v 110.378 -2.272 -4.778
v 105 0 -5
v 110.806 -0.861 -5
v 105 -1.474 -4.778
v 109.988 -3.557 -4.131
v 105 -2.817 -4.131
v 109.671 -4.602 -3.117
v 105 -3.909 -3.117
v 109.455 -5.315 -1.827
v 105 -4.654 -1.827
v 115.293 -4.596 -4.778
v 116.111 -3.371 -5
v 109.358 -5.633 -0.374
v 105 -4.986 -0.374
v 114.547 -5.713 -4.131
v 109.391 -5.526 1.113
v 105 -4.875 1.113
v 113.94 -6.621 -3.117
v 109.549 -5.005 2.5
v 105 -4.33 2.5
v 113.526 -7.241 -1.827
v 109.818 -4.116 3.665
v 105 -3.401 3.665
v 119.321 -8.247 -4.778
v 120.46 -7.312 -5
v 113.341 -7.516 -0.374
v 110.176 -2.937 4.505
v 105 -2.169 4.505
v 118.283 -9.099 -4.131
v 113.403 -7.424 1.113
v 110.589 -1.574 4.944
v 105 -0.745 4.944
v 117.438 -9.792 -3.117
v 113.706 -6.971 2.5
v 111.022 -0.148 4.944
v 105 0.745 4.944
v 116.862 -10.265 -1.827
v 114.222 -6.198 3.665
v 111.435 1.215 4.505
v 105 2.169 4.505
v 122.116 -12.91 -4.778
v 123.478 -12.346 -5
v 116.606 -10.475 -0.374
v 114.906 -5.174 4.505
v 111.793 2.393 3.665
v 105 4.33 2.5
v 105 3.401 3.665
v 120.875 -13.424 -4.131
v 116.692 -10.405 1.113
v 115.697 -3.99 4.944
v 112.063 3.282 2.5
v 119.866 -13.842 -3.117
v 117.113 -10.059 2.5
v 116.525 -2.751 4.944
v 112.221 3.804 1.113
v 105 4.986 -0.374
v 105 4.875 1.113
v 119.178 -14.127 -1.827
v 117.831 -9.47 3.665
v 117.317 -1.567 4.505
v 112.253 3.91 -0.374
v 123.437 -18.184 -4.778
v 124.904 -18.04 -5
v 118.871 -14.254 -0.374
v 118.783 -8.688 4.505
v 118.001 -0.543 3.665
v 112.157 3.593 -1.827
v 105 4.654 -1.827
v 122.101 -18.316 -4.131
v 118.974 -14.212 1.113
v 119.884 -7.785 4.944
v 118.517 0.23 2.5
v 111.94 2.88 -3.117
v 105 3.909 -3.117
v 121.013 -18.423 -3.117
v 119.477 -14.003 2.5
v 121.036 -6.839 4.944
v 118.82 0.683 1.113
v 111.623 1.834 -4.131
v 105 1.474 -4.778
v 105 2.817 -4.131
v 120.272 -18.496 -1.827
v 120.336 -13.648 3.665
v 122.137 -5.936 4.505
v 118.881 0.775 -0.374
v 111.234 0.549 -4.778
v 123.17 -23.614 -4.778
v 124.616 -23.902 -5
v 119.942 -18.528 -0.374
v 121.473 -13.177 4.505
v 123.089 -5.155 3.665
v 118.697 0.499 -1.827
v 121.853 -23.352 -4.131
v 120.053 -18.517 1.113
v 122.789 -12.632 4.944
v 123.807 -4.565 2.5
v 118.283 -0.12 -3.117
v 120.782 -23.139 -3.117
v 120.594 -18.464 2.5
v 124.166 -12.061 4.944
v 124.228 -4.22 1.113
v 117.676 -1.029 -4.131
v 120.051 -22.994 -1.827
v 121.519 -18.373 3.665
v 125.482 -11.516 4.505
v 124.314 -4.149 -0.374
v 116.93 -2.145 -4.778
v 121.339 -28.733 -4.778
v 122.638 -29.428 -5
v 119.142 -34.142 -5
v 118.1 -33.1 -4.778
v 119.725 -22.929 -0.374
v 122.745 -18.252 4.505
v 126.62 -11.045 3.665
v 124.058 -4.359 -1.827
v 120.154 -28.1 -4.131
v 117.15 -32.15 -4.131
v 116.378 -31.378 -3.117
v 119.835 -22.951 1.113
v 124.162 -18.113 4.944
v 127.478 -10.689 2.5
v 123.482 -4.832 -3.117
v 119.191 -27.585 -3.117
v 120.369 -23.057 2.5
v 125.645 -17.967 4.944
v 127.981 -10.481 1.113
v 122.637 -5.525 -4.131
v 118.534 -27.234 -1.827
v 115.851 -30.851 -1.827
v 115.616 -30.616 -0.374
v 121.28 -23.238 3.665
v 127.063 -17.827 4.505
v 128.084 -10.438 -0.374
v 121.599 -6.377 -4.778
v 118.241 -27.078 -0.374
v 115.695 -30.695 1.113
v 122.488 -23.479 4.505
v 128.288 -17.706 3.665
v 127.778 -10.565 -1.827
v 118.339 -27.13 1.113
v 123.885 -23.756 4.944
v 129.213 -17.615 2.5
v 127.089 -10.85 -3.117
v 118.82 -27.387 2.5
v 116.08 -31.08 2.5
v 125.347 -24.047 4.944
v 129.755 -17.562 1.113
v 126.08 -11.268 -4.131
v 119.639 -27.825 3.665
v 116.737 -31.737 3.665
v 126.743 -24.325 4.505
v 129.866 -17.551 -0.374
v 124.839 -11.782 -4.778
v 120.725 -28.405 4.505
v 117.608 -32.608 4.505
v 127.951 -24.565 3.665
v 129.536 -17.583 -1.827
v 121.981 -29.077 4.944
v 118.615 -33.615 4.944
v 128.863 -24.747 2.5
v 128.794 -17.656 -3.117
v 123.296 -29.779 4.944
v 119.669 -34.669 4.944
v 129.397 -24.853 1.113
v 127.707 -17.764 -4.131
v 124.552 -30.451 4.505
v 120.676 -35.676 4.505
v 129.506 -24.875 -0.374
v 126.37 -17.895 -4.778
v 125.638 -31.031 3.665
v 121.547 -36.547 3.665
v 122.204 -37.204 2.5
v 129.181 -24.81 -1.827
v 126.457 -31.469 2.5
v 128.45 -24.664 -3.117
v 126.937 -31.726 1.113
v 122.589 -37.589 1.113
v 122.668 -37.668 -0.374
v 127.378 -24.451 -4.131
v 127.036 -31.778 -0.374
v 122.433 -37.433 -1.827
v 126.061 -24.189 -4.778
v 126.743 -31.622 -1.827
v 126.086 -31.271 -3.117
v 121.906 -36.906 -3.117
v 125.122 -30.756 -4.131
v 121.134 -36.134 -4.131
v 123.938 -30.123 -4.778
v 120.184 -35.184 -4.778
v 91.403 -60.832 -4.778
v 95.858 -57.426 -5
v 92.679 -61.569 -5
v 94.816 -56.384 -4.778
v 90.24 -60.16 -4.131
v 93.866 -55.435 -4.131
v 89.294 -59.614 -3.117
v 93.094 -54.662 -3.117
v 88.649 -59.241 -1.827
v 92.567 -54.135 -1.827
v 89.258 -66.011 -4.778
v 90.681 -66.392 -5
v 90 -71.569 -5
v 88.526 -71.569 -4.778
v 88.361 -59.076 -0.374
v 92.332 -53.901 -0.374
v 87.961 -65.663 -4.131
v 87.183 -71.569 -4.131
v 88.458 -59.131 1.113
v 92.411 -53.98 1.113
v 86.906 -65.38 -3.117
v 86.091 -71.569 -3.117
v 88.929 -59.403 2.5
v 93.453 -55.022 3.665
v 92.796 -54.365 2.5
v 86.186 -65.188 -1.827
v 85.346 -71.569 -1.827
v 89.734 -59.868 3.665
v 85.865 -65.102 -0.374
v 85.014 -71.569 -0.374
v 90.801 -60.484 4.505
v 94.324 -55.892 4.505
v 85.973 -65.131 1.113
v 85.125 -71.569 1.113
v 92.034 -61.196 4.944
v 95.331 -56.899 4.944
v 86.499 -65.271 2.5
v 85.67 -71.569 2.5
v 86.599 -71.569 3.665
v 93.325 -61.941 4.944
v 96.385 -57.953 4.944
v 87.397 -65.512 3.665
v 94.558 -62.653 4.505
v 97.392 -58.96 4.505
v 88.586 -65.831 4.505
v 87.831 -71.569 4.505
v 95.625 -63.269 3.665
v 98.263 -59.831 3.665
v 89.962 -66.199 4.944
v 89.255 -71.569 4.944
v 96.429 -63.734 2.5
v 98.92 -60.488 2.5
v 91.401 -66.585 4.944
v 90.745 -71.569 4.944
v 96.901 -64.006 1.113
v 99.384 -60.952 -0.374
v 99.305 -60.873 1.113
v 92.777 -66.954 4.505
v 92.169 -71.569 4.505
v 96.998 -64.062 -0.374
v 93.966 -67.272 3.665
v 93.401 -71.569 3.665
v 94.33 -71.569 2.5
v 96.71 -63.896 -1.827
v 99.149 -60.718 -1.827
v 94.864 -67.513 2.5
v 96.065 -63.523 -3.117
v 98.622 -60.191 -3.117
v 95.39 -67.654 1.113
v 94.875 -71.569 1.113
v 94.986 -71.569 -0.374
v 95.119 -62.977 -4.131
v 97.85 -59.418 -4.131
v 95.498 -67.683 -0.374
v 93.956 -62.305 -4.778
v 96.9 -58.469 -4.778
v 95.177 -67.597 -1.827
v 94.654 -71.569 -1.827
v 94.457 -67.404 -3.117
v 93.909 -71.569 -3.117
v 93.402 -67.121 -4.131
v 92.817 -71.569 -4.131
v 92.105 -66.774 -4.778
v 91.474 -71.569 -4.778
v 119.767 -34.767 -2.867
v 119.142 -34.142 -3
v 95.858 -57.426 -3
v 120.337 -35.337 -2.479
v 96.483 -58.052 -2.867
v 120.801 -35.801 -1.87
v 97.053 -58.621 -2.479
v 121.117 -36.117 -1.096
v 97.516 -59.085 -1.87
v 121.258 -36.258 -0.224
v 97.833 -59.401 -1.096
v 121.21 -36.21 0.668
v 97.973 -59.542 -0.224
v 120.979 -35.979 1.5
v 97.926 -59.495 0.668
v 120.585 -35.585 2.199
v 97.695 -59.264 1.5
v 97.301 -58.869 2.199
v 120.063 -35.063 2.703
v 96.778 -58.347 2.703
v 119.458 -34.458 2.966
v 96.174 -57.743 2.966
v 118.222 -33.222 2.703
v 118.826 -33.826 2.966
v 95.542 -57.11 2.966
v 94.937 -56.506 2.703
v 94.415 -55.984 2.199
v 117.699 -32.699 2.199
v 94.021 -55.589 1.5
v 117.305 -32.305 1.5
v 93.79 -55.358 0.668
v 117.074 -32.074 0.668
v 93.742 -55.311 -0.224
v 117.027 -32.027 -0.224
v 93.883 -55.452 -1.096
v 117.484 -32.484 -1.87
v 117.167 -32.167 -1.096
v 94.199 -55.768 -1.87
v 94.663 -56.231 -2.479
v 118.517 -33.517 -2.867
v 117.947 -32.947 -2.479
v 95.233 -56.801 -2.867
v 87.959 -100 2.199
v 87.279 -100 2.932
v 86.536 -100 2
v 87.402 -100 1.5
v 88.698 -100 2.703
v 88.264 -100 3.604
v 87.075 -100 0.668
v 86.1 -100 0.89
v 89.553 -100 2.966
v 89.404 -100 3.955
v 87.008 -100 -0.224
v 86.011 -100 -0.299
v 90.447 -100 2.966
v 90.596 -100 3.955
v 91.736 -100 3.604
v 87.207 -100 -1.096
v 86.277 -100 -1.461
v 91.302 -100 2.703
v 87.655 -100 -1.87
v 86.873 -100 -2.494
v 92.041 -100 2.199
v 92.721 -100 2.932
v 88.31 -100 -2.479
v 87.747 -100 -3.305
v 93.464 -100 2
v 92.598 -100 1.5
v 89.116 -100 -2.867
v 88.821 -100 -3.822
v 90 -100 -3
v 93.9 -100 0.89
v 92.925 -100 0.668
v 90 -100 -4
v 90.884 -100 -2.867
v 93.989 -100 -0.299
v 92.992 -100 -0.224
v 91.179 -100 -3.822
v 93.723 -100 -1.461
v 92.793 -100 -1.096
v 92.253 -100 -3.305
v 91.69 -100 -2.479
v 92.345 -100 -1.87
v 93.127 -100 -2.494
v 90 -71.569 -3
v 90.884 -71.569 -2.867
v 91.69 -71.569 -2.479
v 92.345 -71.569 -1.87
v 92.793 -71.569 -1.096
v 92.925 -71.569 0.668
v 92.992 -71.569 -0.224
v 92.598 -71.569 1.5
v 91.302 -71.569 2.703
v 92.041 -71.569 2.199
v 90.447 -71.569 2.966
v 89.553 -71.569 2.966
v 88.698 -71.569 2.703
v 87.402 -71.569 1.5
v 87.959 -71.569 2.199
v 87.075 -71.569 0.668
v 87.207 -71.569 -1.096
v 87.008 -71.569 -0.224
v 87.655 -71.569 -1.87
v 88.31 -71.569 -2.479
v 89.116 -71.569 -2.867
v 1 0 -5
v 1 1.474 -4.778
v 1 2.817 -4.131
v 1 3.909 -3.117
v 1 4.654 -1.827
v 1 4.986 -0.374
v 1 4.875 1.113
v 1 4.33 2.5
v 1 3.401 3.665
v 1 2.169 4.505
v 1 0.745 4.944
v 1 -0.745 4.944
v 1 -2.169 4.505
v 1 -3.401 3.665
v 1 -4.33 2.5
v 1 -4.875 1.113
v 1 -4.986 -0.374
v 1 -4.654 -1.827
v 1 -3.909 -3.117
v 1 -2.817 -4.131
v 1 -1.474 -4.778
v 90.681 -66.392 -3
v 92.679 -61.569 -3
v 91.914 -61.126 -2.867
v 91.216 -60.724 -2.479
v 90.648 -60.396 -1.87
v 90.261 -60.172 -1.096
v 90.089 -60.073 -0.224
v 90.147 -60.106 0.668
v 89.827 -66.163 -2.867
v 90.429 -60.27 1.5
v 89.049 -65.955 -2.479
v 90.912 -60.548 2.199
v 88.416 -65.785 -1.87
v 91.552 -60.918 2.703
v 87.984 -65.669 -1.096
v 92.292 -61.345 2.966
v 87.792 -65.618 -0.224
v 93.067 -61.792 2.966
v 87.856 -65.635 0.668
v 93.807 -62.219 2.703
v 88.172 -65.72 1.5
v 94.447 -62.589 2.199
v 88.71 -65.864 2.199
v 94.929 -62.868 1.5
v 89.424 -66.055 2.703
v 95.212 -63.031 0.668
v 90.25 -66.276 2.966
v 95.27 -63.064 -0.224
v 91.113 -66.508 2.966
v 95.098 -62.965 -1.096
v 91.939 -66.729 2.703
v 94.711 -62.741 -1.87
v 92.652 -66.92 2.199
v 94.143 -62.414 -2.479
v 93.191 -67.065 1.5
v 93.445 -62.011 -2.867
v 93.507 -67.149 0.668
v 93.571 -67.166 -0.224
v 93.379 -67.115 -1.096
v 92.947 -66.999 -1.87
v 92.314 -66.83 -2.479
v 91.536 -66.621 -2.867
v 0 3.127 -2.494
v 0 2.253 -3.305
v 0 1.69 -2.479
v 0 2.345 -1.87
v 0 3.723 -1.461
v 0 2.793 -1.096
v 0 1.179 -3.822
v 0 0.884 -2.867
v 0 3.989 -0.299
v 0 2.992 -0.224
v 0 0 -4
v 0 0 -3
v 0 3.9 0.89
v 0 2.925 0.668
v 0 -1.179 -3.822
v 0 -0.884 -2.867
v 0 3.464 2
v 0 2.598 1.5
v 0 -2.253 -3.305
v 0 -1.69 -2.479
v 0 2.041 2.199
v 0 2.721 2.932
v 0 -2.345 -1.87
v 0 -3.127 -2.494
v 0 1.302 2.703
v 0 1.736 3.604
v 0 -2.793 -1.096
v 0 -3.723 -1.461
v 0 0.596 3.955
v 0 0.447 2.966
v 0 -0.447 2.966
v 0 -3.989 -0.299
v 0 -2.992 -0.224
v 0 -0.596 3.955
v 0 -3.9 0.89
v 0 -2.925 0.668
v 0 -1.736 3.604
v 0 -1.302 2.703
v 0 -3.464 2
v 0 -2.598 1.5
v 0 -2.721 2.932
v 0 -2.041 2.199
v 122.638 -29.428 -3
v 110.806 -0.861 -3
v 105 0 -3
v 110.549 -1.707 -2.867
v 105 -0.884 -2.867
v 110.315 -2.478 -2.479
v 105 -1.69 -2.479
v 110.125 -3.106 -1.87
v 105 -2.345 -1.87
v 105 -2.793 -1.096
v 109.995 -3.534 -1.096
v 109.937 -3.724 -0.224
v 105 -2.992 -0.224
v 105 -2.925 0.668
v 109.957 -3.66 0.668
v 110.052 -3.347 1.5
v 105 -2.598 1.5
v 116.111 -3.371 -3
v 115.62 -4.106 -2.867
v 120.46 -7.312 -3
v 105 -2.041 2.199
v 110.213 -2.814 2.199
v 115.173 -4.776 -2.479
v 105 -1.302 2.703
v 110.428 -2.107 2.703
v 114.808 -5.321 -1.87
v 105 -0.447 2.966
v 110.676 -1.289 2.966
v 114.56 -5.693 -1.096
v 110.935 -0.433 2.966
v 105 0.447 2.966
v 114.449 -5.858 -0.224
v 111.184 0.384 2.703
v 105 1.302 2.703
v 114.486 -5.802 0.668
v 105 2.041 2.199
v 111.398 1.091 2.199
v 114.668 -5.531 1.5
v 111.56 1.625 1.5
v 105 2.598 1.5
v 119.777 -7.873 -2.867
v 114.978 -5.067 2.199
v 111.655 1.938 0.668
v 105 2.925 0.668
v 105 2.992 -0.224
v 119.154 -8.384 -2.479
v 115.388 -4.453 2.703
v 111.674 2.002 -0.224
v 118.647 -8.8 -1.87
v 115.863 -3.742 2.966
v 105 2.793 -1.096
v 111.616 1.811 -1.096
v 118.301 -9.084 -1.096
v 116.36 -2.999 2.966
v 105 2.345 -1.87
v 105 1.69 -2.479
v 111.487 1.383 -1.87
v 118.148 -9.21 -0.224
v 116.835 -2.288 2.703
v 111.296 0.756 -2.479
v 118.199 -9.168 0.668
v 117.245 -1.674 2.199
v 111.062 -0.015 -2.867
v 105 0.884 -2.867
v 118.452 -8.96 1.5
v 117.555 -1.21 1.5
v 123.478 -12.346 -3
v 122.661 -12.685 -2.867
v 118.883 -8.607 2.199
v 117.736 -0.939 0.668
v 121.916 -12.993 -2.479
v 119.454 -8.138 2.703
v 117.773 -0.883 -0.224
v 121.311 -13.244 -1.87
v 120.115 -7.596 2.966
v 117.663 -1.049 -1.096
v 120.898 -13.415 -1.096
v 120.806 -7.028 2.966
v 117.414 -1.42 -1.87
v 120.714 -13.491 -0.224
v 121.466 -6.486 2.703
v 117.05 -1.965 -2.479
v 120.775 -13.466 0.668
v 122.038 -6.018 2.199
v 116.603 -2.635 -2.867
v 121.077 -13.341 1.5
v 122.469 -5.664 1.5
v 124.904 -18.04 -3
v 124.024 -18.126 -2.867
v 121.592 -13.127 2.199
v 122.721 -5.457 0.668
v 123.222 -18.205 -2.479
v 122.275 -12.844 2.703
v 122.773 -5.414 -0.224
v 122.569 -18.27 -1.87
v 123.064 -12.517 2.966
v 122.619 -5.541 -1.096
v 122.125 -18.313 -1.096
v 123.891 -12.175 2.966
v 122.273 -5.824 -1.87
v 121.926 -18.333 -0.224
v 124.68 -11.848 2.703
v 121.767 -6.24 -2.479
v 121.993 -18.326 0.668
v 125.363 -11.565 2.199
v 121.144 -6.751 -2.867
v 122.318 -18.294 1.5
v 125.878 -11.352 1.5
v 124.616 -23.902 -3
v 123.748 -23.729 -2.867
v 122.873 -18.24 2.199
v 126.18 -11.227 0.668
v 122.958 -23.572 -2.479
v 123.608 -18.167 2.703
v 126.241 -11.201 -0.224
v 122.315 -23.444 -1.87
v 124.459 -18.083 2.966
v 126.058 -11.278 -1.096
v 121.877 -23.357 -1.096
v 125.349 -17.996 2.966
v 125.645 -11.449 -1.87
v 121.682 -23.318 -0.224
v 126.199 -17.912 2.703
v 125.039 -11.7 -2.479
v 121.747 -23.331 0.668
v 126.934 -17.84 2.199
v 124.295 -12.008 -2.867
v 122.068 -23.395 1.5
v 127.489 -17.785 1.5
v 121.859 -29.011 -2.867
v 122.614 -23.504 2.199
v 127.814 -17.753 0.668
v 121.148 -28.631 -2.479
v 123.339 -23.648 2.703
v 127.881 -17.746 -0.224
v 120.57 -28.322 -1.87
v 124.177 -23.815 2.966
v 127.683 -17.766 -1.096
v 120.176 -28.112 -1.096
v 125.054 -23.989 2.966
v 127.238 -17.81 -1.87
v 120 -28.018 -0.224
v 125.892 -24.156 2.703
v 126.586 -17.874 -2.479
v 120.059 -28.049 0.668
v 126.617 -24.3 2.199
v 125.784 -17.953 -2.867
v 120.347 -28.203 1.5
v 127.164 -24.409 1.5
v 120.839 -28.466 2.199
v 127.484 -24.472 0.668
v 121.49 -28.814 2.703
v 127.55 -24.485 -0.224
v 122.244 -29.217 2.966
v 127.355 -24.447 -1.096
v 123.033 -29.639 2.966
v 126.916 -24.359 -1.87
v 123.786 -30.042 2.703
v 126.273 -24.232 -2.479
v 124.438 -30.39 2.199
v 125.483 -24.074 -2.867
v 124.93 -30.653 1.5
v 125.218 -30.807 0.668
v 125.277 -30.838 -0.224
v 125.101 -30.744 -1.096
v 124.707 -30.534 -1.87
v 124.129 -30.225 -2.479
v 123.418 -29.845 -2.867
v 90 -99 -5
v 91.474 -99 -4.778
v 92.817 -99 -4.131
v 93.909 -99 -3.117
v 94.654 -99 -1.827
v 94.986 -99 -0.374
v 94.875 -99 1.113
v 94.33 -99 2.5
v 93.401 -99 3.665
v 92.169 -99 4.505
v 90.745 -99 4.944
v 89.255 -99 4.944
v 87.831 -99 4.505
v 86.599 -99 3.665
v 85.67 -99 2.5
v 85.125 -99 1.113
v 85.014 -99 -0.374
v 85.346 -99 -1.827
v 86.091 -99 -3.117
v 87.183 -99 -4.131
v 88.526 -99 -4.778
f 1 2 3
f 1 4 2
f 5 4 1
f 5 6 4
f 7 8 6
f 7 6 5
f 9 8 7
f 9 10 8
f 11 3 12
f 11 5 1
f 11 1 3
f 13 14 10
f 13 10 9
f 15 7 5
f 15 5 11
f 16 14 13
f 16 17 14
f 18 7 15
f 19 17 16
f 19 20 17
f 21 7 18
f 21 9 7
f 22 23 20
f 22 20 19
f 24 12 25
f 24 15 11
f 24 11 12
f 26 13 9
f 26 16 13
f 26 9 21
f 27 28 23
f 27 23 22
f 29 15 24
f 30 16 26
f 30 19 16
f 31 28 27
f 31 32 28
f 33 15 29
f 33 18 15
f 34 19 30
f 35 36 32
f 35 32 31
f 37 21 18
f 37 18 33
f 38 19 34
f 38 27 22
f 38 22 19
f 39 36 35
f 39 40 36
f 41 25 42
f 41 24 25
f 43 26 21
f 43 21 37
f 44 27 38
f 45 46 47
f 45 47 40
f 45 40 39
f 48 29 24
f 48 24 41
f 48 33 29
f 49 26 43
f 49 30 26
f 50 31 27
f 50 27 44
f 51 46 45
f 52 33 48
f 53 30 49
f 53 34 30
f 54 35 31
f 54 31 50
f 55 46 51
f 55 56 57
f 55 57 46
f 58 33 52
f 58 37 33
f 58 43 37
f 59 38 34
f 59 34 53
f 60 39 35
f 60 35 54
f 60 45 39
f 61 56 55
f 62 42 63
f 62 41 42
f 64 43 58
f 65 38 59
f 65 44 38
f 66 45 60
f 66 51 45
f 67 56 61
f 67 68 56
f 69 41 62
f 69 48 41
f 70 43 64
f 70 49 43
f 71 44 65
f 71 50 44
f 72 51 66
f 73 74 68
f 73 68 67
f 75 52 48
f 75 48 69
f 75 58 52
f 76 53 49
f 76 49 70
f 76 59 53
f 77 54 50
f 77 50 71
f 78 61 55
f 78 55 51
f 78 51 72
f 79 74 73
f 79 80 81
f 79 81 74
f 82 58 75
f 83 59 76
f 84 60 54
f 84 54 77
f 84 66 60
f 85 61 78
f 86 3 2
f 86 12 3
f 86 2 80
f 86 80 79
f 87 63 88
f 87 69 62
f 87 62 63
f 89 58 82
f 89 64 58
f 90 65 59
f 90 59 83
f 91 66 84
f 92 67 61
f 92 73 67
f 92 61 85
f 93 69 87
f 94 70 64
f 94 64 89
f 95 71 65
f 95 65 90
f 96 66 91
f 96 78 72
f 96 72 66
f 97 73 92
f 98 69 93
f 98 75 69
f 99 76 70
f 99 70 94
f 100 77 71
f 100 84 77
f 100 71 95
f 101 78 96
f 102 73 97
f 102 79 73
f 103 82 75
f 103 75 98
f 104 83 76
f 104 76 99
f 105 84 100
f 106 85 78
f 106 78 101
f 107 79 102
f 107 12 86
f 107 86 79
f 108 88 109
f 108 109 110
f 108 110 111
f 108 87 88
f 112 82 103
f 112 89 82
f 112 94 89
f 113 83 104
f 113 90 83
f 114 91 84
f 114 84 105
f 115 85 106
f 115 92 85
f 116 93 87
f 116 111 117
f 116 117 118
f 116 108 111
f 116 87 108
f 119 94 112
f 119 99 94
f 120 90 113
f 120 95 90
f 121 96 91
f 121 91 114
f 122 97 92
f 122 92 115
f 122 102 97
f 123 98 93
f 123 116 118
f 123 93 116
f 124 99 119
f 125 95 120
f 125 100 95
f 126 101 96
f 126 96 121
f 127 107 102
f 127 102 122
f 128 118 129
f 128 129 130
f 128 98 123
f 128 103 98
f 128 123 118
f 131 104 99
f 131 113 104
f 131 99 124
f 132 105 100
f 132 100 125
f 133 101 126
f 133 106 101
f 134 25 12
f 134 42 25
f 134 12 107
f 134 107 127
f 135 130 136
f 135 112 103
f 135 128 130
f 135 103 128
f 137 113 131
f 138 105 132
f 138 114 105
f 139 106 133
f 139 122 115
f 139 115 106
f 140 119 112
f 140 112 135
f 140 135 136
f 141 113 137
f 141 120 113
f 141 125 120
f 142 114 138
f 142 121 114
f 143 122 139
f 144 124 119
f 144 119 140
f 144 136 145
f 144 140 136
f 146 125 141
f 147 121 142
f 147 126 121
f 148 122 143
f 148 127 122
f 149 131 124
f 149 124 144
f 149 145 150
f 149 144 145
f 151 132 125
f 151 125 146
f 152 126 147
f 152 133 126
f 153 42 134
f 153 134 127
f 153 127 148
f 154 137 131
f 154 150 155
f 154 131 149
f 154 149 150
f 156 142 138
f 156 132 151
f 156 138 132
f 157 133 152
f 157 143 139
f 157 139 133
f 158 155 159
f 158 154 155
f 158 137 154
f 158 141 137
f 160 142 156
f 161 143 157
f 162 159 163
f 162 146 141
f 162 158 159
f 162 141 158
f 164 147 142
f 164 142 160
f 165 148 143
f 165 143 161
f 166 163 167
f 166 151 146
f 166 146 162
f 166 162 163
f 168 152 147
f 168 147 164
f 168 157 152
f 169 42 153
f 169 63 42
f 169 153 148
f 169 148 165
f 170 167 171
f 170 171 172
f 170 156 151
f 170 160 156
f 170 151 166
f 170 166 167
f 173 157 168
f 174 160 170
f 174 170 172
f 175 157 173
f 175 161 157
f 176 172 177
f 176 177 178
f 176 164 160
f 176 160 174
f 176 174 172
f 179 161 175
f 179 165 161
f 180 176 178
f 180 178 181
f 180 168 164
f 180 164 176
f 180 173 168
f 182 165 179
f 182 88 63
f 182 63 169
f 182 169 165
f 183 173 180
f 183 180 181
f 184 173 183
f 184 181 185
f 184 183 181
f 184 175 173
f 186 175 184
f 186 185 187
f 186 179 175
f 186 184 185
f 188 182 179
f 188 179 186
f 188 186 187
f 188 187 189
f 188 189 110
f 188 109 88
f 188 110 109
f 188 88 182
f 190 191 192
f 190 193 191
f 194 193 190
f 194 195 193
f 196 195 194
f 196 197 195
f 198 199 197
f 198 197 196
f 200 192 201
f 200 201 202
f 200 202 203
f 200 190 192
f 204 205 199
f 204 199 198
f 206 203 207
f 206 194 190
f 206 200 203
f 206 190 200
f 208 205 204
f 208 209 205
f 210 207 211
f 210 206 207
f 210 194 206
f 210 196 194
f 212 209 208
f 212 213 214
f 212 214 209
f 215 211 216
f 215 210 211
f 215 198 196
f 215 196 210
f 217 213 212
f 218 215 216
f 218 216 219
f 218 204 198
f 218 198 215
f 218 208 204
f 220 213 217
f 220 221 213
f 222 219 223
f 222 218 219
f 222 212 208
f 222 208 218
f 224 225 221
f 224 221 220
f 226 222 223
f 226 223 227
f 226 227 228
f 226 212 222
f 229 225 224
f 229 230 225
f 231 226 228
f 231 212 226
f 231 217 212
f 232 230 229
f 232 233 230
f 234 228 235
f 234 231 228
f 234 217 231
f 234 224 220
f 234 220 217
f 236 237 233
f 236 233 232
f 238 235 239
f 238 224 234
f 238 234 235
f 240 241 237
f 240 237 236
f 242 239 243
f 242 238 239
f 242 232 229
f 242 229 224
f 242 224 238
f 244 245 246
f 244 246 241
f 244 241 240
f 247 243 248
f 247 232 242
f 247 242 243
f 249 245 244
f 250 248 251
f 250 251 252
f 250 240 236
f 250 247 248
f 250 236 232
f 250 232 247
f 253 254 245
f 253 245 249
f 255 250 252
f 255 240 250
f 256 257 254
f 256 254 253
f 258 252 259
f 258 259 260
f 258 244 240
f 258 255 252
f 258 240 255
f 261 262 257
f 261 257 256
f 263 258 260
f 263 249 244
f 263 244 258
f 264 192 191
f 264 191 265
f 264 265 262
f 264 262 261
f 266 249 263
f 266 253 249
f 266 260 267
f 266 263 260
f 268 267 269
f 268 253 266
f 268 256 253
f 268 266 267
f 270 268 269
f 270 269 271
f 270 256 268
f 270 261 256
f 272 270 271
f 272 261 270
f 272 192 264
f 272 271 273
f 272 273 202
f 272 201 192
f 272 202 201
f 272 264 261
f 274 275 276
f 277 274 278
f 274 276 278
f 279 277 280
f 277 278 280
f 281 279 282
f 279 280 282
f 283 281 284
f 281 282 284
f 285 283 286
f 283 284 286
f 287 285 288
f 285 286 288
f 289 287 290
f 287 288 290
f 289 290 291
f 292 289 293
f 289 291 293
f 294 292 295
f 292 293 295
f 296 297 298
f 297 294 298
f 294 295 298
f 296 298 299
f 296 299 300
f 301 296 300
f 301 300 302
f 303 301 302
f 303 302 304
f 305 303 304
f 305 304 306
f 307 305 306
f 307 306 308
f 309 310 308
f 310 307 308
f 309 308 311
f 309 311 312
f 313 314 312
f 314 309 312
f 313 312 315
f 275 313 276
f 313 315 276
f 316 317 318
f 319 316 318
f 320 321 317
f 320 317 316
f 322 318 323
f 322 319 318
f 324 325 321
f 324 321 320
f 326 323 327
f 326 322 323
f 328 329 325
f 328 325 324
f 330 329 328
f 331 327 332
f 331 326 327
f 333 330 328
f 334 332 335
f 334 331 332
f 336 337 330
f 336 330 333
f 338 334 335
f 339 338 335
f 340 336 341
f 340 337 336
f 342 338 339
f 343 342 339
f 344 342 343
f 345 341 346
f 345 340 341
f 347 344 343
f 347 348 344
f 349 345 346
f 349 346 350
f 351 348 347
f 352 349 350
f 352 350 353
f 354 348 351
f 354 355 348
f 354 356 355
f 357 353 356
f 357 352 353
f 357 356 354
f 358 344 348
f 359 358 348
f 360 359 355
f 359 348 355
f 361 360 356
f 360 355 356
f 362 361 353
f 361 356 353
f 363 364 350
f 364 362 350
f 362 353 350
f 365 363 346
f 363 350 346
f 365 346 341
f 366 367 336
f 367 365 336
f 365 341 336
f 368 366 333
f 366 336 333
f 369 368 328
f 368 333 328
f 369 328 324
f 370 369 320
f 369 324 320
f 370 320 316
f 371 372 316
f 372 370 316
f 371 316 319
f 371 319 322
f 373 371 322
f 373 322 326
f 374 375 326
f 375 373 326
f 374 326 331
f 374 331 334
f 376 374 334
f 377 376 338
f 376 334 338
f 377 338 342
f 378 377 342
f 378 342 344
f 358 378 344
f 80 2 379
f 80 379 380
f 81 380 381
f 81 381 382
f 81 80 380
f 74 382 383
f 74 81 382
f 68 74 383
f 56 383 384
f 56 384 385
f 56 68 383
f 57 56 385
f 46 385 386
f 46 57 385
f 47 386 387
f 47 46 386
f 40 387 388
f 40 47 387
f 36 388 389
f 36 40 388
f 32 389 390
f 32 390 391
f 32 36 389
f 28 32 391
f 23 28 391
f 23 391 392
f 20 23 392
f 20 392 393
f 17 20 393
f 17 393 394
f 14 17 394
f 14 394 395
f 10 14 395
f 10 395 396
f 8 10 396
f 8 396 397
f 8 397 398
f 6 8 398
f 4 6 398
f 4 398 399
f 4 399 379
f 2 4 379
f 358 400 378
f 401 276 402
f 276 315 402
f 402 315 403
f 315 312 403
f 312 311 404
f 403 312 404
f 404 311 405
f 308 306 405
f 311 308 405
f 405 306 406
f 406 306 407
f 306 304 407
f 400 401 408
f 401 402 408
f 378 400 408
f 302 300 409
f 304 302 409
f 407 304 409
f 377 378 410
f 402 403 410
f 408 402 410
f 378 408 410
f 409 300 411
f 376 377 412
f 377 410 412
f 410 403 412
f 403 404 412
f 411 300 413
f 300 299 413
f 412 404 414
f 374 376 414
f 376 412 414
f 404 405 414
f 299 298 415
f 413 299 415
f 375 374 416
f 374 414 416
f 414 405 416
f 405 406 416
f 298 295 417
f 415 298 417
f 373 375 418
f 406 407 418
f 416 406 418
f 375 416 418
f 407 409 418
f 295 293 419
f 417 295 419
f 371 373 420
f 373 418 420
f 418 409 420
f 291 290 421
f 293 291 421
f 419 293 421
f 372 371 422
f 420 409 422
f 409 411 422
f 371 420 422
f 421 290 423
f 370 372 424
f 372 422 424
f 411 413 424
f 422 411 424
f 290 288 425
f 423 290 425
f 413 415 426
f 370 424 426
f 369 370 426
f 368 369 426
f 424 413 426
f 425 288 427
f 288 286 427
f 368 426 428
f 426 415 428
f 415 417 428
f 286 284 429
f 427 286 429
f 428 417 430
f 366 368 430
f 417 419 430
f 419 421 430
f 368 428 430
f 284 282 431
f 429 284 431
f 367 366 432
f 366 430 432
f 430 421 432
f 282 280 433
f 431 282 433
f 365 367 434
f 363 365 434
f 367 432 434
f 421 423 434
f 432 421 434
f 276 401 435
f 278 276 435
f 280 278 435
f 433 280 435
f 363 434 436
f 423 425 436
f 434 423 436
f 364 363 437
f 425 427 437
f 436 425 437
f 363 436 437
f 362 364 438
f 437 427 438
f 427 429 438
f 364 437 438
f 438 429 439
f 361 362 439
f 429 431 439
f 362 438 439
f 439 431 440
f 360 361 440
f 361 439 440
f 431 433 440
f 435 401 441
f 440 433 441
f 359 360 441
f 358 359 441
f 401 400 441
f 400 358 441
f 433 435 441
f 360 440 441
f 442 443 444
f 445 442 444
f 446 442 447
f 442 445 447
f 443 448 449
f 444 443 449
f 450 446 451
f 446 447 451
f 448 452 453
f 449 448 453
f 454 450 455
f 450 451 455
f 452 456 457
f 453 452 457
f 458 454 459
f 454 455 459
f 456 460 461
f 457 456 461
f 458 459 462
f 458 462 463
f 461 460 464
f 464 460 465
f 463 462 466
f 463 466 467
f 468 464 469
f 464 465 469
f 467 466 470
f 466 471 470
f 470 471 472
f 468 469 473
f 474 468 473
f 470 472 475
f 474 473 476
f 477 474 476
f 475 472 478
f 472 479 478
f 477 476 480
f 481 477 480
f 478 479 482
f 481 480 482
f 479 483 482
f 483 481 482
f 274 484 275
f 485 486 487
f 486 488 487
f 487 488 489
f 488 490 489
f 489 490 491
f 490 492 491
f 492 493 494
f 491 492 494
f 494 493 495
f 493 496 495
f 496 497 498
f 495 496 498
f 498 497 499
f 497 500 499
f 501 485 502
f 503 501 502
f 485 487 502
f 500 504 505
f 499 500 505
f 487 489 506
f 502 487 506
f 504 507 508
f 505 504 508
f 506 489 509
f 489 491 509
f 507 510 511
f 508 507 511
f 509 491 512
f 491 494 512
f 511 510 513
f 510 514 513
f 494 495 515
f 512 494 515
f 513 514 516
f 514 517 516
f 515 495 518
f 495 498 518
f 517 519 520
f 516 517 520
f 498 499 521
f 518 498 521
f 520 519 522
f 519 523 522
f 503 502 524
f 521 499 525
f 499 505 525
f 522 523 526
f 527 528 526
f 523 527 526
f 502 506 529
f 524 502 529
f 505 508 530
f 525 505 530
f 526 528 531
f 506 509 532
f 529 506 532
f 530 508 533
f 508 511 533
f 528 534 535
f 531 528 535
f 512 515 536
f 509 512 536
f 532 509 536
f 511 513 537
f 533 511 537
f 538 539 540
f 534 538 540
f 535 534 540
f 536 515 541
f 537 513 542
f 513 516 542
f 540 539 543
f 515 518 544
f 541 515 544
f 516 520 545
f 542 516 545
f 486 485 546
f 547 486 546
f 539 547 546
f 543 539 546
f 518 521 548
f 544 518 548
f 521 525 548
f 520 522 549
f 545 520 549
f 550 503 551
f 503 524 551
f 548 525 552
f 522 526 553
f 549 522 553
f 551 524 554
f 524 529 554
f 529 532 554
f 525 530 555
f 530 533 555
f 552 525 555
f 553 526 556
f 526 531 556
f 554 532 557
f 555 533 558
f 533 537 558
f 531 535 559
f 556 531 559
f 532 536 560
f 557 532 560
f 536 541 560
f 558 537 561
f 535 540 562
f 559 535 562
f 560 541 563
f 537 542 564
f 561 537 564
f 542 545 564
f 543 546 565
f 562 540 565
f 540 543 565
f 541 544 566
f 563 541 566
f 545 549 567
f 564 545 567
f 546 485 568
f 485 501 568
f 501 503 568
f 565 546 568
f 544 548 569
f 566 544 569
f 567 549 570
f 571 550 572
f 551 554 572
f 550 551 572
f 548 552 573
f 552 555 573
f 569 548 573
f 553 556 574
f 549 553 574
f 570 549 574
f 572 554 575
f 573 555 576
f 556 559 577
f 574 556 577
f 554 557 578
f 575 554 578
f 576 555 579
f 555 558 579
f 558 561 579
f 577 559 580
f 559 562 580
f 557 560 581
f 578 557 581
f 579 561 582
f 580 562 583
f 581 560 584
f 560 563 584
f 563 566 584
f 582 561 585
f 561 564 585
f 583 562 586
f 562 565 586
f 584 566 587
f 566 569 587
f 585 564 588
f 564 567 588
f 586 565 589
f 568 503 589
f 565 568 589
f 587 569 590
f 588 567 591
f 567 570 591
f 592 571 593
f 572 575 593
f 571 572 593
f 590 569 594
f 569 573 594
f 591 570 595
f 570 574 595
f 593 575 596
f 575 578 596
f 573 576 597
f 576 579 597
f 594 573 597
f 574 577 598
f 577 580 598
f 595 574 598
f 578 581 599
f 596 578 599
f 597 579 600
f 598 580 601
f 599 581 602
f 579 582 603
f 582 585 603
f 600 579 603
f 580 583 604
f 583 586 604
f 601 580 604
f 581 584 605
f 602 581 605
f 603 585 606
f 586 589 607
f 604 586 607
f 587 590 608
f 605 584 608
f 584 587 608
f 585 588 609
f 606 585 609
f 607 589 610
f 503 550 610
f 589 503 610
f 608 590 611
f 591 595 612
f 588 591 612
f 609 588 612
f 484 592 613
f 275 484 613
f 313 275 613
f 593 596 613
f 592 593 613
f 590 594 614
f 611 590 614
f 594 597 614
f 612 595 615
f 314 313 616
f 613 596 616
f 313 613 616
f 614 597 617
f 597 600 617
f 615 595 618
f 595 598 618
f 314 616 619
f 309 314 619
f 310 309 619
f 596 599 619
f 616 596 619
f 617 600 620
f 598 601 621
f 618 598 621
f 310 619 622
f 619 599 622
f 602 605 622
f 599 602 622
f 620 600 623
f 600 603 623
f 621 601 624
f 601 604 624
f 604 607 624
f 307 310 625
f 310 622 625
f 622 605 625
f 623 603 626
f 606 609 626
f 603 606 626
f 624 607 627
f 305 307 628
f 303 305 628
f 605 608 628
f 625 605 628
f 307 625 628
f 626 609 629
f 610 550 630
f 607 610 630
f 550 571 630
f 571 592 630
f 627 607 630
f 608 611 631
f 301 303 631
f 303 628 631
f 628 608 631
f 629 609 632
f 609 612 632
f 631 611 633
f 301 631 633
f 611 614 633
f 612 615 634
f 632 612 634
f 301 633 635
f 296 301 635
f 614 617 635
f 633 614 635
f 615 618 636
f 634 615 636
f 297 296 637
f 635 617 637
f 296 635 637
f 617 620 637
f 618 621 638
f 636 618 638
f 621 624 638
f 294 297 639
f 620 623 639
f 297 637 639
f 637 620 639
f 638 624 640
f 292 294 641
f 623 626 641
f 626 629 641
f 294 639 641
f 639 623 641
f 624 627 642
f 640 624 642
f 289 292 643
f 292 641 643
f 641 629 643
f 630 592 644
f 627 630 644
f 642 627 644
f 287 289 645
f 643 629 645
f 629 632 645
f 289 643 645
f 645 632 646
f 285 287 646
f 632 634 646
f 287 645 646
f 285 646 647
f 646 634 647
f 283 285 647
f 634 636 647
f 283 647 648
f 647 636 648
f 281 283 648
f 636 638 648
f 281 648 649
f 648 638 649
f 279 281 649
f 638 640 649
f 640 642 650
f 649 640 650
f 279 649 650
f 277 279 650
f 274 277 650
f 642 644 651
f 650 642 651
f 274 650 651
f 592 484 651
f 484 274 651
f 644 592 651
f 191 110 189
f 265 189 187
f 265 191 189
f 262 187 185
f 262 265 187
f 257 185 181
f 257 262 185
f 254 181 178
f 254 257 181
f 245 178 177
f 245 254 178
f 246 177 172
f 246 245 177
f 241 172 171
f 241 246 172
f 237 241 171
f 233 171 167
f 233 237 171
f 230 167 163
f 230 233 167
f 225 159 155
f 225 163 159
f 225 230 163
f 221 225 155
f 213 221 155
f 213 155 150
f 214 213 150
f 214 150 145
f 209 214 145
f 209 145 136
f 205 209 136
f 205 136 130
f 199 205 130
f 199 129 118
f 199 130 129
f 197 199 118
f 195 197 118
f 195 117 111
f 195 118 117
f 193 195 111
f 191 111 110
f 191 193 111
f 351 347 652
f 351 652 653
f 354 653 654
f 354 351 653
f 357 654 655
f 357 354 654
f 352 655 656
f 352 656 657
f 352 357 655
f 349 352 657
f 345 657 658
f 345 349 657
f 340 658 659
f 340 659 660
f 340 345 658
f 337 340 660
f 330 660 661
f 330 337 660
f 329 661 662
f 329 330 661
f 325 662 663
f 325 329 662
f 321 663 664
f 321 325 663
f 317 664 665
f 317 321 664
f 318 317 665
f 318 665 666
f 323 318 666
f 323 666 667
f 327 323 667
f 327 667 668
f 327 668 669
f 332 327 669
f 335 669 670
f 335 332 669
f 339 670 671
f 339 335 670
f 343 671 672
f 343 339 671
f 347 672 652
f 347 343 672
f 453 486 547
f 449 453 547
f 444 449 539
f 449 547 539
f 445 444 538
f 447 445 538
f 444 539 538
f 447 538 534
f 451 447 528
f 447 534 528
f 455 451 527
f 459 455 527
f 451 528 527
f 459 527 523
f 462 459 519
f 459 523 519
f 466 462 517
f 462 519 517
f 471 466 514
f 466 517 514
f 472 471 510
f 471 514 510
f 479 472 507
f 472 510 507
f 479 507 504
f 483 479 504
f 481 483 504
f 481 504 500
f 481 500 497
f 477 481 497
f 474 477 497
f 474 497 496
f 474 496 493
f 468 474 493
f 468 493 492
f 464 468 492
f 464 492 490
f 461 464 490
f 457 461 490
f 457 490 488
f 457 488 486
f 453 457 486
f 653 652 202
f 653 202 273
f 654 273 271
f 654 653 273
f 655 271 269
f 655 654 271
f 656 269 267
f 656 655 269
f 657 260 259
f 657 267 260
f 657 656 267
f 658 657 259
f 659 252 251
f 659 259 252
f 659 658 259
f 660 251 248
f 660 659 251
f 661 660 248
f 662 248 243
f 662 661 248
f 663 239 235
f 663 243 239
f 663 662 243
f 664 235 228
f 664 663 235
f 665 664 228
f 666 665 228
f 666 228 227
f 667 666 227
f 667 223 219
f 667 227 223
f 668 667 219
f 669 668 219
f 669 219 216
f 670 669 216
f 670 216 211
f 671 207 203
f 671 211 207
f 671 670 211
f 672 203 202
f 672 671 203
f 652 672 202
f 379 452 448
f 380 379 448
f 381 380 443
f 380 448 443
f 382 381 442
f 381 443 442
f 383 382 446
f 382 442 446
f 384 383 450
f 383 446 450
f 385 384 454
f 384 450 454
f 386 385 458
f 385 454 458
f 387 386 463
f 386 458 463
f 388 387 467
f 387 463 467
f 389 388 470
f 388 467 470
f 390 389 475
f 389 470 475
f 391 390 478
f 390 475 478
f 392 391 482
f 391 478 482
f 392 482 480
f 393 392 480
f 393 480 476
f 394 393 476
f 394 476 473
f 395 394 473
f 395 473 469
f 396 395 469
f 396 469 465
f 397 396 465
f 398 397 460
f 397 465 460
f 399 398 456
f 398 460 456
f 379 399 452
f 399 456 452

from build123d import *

# Parameters (mm, degrees)
SKETCH_2_R     = 5
SKETCH_2_R_2   = 3
CHAMFER_1_SIZE = 1


with BuildPart() as part:
    # По траектории1: sweep along a path in Эскиз1
    with BuildLine(Plane.XY) as sweep_1_path:
        Line((0, 0), (105, 0))
        ThreePointArc((105, 0), (123.47759065, -12.346331353), (119.142135624, -34.142135624))
        Line((119.142135624, -34.142135624), (95.857864376, -57.426406871))
        ThreePointArc((95.857864376, -57.426406871), (91.52240935, -63.914873848), (90, -71.568542495))
        Line((90, -71.568542495), (90, -100))
    # Эскиз2 → По траектории1 (sweep)
    with BuildSketch(Plane(origin=(0, 0, 0), x_dir=(0, 0, -1), z_dir=(1, 0, 0))):
        Circle(SKETCH_2_R)
        Circle(SKETCH_2_R_2, mode=Mode.SUBTRACT)
    sweep(path=sweep_1_path.line)

    # Фаска1
    chamfer_1_edges = [part.edges().sort_by_distance(p)[0] for p in [
        (90, -100, 5),
        (0, 0, 5),
    ]]
    chamfer(chamfer_1_edges, length=CHAMFER_1_SIZE)


solid = part.part
